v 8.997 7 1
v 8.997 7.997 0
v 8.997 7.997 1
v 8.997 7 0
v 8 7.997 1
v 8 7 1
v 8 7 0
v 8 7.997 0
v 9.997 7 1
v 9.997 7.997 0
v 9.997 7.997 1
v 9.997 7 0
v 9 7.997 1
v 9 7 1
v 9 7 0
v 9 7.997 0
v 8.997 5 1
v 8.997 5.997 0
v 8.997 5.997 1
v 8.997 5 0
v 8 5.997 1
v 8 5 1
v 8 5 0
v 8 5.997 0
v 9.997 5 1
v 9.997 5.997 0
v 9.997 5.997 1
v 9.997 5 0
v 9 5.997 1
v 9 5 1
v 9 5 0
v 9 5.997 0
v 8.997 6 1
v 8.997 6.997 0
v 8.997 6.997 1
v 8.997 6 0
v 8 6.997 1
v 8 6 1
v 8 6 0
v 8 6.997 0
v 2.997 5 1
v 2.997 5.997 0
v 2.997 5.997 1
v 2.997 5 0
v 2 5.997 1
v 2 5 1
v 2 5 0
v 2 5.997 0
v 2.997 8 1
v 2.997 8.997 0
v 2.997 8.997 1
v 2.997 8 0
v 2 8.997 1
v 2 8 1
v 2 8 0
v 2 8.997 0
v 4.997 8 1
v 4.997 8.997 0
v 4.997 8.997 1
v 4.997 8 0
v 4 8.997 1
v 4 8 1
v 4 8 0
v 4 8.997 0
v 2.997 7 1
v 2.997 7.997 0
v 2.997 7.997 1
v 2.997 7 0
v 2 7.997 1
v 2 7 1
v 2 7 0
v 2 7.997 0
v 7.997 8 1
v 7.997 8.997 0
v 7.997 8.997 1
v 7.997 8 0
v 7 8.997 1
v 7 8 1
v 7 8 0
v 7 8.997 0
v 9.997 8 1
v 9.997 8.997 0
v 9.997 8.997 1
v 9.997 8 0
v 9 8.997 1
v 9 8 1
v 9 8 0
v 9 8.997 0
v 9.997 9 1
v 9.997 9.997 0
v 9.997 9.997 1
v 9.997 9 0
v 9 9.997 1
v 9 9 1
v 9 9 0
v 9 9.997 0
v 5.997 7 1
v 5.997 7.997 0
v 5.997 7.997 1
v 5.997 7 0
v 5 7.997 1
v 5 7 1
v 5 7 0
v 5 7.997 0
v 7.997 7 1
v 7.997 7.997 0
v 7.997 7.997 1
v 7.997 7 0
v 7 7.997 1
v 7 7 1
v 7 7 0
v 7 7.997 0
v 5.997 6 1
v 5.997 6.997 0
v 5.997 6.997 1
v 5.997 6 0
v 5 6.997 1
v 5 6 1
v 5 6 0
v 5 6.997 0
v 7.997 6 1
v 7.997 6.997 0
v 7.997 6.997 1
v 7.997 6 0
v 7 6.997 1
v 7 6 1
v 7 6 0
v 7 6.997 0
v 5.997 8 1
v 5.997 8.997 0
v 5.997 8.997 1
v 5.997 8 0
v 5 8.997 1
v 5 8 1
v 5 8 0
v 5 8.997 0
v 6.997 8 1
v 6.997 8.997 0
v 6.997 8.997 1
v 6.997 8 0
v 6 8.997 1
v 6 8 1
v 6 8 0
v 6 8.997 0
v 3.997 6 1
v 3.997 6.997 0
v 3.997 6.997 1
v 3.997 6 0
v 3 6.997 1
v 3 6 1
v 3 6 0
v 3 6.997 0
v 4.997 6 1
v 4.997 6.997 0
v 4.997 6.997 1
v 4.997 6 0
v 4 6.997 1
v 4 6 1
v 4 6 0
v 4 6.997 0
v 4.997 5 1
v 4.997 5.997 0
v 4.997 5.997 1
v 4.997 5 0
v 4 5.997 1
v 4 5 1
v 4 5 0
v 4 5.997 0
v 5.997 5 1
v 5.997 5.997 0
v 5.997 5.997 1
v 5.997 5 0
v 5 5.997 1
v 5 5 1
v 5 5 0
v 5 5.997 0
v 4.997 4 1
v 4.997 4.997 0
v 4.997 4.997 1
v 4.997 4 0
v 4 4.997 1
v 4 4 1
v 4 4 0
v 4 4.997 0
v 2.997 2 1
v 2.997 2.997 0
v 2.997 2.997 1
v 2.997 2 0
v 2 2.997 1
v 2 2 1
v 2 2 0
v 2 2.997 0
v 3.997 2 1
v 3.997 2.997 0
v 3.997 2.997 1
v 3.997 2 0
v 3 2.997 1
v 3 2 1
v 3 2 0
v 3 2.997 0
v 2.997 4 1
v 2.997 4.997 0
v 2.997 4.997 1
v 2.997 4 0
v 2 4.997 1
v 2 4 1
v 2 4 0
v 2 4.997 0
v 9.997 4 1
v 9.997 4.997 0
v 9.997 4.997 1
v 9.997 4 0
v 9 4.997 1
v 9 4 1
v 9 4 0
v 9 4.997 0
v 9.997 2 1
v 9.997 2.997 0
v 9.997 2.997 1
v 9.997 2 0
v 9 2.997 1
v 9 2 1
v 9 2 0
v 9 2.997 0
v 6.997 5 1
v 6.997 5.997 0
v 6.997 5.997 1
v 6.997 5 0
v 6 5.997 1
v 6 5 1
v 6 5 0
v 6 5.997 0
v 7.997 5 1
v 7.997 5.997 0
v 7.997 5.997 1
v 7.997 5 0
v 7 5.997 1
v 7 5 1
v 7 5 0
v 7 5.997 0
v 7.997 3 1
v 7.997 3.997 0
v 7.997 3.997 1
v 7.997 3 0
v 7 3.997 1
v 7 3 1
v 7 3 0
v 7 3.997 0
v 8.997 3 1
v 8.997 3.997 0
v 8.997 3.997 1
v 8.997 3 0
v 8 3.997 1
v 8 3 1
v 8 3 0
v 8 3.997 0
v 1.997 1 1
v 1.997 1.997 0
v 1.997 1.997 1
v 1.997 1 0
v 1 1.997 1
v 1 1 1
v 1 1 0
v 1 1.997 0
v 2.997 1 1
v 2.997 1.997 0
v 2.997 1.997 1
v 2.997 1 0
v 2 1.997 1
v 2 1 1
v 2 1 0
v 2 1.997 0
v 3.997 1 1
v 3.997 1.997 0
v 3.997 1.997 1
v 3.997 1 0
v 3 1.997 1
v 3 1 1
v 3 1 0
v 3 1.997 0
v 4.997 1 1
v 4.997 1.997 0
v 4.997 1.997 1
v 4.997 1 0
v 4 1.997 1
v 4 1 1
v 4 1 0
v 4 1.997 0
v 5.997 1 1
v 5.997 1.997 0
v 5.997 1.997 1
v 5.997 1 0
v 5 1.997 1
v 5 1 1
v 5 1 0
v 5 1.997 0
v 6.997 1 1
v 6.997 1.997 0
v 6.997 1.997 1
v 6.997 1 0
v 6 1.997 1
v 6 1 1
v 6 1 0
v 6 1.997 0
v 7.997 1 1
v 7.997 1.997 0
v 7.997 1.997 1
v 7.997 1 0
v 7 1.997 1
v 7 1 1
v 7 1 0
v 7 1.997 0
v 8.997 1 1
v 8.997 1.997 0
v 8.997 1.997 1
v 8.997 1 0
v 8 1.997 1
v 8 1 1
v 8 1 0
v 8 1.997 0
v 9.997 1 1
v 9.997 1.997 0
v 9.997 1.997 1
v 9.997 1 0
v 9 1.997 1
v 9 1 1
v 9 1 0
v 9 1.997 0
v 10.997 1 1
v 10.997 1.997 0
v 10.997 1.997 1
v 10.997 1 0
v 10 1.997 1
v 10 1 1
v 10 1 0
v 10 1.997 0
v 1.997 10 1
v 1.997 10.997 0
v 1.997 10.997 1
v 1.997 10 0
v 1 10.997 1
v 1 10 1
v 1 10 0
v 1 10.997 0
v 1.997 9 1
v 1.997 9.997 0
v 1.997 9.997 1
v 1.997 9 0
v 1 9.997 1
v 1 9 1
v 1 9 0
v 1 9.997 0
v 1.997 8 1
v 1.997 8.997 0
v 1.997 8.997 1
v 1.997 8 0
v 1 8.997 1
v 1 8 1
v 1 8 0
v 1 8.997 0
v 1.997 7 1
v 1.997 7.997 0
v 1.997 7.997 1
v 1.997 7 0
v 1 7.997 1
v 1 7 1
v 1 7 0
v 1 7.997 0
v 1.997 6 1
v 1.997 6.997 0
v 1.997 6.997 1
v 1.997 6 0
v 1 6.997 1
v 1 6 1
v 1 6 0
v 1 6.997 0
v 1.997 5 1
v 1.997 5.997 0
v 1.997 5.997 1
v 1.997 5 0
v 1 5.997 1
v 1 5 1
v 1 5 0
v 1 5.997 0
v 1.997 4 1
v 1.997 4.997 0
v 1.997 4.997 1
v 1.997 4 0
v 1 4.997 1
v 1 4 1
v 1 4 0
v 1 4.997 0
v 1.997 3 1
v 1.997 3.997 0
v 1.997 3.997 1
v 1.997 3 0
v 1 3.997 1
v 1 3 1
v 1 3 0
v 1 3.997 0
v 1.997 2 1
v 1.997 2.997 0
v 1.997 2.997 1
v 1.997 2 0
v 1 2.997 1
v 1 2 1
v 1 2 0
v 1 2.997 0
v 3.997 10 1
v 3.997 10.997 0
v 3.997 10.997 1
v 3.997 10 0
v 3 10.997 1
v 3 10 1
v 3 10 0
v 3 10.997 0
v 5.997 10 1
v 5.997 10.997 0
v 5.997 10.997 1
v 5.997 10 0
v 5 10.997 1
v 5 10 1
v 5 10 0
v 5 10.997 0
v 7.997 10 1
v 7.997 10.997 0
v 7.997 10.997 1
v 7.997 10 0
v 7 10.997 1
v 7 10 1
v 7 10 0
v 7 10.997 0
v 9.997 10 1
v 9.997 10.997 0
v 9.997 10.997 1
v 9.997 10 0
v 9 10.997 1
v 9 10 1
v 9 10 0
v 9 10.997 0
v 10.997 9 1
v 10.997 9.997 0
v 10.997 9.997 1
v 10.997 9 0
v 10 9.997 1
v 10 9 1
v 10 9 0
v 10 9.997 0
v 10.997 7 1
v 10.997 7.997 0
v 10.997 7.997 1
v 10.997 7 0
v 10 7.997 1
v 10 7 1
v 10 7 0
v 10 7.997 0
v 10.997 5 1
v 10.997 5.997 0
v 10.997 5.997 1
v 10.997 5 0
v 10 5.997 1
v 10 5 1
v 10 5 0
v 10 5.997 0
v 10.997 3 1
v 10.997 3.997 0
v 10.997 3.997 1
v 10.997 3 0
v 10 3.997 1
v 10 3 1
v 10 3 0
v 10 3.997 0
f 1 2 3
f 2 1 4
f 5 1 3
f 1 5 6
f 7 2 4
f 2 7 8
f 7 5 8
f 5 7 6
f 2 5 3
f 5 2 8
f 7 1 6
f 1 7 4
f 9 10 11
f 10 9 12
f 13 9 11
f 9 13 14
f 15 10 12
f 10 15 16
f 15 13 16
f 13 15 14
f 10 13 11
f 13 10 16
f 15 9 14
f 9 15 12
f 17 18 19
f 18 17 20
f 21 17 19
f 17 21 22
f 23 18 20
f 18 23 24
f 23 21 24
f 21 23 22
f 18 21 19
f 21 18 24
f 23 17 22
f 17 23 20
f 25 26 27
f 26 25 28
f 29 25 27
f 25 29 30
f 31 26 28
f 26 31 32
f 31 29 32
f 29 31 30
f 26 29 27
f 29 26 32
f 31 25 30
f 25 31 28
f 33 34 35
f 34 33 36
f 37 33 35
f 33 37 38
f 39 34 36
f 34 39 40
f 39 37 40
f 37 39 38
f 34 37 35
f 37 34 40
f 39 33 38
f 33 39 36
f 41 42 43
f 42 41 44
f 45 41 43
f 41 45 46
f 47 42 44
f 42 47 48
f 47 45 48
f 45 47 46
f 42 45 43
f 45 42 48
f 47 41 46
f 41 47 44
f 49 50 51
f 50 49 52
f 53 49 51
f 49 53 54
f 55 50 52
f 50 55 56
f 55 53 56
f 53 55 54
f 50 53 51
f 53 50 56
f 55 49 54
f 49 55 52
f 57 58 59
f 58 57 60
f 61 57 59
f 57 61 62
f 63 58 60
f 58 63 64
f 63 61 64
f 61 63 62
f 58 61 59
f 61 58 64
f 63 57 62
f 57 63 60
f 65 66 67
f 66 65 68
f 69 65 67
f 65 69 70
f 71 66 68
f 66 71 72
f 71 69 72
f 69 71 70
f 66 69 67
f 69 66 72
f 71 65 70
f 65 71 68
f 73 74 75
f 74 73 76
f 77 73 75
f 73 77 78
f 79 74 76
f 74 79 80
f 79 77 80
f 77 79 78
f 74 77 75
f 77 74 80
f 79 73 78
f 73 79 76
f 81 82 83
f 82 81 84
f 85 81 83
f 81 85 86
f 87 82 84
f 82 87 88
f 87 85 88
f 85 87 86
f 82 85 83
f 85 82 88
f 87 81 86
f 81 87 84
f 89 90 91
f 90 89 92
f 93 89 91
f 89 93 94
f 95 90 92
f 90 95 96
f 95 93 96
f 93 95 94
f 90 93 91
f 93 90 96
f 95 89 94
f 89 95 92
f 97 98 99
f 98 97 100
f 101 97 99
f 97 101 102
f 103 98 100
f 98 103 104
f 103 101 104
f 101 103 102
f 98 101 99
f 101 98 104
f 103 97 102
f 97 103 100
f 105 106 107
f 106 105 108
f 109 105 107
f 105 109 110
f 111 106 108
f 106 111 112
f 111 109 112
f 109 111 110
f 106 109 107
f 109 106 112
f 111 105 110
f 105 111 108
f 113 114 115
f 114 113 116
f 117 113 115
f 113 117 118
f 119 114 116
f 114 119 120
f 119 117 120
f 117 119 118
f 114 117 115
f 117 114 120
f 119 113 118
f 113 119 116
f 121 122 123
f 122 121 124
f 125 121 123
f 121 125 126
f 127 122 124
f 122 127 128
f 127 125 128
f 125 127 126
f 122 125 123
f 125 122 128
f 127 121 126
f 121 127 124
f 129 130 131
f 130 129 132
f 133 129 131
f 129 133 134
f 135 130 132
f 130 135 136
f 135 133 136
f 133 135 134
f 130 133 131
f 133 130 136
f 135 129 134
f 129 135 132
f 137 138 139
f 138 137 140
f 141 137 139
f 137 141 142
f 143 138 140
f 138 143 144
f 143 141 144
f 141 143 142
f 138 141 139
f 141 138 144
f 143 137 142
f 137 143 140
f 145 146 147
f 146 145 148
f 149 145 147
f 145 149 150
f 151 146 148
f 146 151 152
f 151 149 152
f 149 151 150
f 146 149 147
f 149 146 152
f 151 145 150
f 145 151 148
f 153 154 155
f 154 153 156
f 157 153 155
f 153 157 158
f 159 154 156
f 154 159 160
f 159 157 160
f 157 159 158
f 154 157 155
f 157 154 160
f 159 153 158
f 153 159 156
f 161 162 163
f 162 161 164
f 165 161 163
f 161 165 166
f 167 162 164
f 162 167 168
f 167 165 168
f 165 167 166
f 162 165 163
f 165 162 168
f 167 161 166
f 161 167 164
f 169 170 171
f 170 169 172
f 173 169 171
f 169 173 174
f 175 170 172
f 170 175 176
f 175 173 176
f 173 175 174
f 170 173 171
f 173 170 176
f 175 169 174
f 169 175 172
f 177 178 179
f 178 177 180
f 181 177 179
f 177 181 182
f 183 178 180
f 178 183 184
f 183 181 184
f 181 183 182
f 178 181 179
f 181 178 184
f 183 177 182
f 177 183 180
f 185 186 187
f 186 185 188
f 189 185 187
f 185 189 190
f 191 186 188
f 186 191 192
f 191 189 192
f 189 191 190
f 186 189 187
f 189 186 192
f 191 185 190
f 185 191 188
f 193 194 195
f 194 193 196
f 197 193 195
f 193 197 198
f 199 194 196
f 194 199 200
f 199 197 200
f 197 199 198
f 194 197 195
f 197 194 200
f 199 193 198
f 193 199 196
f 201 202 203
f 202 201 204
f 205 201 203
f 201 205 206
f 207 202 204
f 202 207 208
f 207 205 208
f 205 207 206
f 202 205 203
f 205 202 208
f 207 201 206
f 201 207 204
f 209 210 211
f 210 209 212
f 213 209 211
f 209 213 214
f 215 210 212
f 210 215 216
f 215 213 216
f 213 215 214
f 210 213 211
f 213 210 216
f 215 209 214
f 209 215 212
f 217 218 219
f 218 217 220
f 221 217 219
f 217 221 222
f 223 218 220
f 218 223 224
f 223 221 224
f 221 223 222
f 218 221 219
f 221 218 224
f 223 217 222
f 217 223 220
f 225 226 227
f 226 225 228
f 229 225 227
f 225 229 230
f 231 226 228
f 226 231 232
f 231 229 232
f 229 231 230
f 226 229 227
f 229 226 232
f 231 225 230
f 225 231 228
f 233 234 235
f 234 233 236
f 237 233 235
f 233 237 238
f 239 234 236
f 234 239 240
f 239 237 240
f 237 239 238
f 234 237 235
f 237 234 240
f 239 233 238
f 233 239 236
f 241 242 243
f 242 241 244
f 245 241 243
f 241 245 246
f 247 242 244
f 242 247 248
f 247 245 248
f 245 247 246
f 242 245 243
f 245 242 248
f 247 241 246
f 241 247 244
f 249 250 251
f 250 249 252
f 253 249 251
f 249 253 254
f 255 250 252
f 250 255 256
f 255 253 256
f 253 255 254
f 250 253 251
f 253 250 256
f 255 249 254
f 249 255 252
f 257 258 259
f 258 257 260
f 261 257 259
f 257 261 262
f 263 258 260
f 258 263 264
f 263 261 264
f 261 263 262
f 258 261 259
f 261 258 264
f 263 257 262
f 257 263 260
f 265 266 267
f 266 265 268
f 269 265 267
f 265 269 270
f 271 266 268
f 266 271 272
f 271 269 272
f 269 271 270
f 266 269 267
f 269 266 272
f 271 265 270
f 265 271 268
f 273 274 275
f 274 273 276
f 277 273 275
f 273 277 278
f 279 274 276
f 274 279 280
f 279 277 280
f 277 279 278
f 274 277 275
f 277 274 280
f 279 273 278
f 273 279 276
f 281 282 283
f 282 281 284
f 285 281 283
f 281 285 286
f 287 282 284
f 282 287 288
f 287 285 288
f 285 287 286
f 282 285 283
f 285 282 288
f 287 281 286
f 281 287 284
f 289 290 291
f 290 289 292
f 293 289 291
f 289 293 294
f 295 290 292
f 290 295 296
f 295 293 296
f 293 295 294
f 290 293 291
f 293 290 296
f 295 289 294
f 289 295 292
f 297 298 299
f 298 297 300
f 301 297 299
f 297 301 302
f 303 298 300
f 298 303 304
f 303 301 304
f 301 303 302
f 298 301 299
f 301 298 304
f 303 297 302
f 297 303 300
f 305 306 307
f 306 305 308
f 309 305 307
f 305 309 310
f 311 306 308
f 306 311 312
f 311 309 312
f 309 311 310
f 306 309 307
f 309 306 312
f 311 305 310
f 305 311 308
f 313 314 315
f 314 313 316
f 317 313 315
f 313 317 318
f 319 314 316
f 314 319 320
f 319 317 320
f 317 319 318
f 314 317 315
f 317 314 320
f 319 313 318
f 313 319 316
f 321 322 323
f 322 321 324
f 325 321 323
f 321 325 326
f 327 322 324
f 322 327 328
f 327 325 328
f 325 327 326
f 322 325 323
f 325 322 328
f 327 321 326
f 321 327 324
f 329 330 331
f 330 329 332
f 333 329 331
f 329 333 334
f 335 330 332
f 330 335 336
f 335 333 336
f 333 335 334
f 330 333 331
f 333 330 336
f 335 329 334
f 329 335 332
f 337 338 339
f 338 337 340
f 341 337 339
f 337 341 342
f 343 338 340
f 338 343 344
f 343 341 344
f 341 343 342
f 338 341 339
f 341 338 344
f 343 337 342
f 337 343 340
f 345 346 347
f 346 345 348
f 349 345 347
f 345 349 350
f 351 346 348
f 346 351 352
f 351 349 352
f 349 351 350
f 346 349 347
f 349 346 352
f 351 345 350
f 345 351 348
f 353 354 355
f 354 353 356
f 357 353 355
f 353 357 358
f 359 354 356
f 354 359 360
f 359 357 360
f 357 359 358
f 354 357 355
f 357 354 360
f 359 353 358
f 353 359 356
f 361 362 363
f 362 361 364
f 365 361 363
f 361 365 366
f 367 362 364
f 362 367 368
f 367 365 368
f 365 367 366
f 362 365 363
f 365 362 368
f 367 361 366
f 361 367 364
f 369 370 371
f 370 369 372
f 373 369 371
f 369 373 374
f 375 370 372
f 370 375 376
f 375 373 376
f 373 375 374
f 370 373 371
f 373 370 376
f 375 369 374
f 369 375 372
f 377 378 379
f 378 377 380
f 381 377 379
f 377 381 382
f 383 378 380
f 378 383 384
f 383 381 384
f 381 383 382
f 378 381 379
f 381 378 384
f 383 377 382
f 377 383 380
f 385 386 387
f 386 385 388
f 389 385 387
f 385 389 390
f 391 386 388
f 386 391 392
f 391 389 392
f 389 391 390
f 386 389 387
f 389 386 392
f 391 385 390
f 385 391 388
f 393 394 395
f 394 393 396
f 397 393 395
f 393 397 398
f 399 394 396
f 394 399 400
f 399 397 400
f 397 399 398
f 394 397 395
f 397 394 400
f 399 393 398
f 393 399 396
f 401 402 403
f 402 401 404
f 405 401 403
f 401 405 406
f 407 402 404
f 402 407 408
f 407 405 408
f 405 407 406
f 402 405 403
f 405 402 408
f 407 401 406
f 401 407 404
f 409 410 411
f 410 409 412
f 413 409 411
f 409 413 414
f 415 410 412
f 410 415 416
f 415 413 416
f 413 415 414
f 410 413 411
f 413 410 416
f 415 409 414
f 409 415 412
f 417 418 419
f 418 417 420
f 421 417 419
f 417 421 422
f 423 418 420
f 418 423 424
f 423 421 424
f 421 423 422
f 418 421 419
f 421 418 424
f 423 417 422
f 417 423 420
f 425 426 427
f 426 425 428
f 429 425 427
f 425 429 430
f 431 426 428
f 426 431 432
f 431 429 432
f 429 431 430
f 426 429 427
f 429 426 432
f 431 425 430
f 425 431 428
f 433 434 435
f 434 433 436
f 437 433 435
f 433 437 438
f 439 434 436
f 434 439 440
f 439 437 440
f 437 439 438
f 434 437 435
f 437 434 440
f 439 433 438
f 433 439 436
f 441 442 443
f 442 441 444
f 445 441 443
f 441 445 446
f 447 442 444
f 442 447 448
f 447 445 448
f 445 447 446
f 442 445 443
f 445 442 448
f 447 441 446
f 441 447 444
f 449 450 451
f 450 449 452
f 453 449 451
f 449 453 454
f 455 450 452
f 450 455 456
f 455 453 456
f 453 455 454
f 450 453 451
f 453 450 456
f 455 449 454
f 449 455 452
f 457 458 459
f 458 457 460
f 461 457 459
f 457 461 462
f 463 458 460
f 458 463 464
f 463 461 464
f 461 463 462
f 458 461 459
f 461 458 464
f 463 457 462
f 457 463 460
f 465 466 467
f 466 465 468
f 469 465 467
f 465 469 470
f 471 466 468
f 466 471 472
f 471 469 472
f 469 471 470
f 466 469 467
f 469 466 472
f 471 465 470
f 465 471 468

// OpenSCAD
// file: ../../util/bitmap.scad
/*****************************************************************************
 * Module Bitmap Library
 * Modules to create bitmaps of unit squares from 1 or 2 dimensional vectors.
 *****************************************************************************
 * Copyright 2017 Chris Baker
 *
 * This program is free software: you can redistribute it and/or modify
 * it under the terms of the GNU Lesser General Public License as published by
 * the Free Software Foundation, either version 3 of the License, or
 * (at your option) any later version.
 *
 * This program is distributed in the hope that it will be useful,
 * but WITHOUT ANY WARRANTY; without even the implied warranty of
 * MERCHANTABILITY or FITNESS FOR A PARTICULAR PURPOSE.  See the
 * GNU Lesser General Public License for more details.
 *
 * You should have received a copy of the GNU Lesser General Public License
 * along with this program.  If not, see <http://www.gnu.org/licenses/>.
 *****************************************************************************
 * Usage:
 * Include this file with the "use" tag.
 * Depends on compat.scad library.
 *
 * API:
 *   1dbitmap(bitmap, center, pullback, vector_mode)
 *   2dbitmap(bitmap, center, pullback, vector_mode)
 *     Generate a 1 or 2-Dimensional field of modules based on the provided
 *     bitmap vector. See Bitmap Vectors below.
 *     The center flag determines whether to center the bitmap on the origin.
 *     The pullback value shrinks each module in the x and y dimension by the
 *     specified amount. A negative value will expand the modules so they
 *     blend into each other.
 *     The vector_mode flag determines whether to create 3D solid geometry
 *     (unit cubes) or 2D vector geometry (squares).
 *
 * Bitmap Vectors:
 *   The bitmap vectors primarily provide boolean information.
 *   A module will be placed where these vectors have a postive value and
 *   skipped where they have a negative value. I.E. 0, -1, false, and undef
 *   are all equivalent and result in a skip. 1 and true are equivalent and
 *   result in a placed 1-unit module.
 *   Further, if the value is an integer it will be treated as a height for
 *   the module, allowing z-maps to be created.
 *   If the value is not an integer or boolean, it will be treated as a color
 *   reference. This can be a string or RGBA vector that will be used to
 *   color the module in the OpenSCAD preview window.
 *   In current versions of OpenSCAD, the color has no effect in the rendered
 *   view or STL output.
 *
 * Vector Mode:
 *   Although OpenSCAD supports generating 2D geometry, there are several
 *   caveats:
 *   - 2D and 3D geometry cannot be mixed
 *   - Extruding 2D geometry causes color information to be lost
 *   - All 2D geometry is projected onto the XY plane when rendering
 *   - Rendering also results in loss of color (same as 3D)
 *   - The SVG exporter is somewhat limited:
 *     - The pixel size of the image is hard-coded in the file
 *     - The title of the image is a generic string
 *     - The color selection for stroke and fill is fixed
 *     - The stroke-width is set to a large value that will cause overlap
 *     - The background is transparent
 *     - Only one path element is created with all of the geometry; there is
 *       no easy way to split up the geometry into multiple logical units.
 *     - These issues can mostly be resolved by hand-editing the file:
 *       - Remove or modify the width and height parameters from the svg
 *         element at the top of the file to provide better scaling.
 *       - Edit the title element at the top of the file to change the title.
 *       - Edit the stroke and fill parameters of the path element (these will
 *         probably be at the end of the file).
 *       - Set the stroke-width parameter for the path element to 0.
 *****************************************************************************/
use <compat.scad>

/*
 * 2dbitmap - Turn a 2D vector into a bitmap of cubes
 *
 * bitmap - 2D vector representing where to place each cube
 *          Value can either be boolean, z-height, or color
 * center - center cubes around the origin
 * pullback - size of gap around each pixel (screendoor)
 * vector_mode - create a 2D vector drawing instead of 3D extrusion
 */
module 2dbitmap(bitmap=[[1,0],[0,1]], center=false, pullback=0.003, vector_mode=false)
{
  if (bitmap!=undef) {
	ylen=len(bitmap)-1;

	for (y=[0:ylen]) {
		xlen=len(bitmap[y])-1;
		for (x=[0:xlen])
			translate([x-(center?xlen/2:0),ylen-y-(center?ylen/2:0),0])
				if (is_indexable(bitmap[y][x]))
					color(bitmap[y][x])
						if (vector_mode)
							square([1-pullback,1-pullback], center=center);
						else
							cube([1-pullback,1-pullback,1], center=center);
				else
					if (bitmap[y][x])
						if (vector_mode)
							square([1-pullback,1-pullback], center=center);
						else
							cube([1-pullback,1-pullback,clamp_nonnum(bitmap[y][x])], center=center);
	}
  }
}

module 1dbitmap(bitmap=[1,0,1,0,1], center=false, pullback=-0.003, vector_mode=false)
	if (bitmap!=undef)
		2dbitmap([bitmap], center, pullback, vector_mode);

/*
 * Examples
 */

// 1D with z-height
translate([10,0,0]) scale([1,10,1])
	1dbitmap(bitmap=[1,1,0,2,0,0,3], pullback=.1);

// 1D with boolean
translate([-20,0,0]) scale([1,10,1])
	1dbitmap(bitmap=[true,false,true,false,true,true]);

// 2D with z-height
scale([2,2,1])
	2dbitmap(bitmap=[[1,0,2,1],[0,3,3,0],[1,1,0,1]],
		center=true);

// 1D with color
translate([0,-10,0]) scale([1,3,1])
	1dbitmap(bitmap=["red","white","blue",[0,0.3,0,0.5]]);

// 1D with color using 2D-vector-mode
translate([-7,-8,0]) scale([1,2])
	1dbitmap(bitmap=["red",0,"blue",0,"green"], vector_mode=true);
translate([-4.5,-10,0]) scale([1,2])
	1dbitmap(bitmap=["red",0,"blue",0,"green"], vector_mode=true, center=true);

// Check behavior with undef
1dbitmap(undef);
2dbitmap(undef);
// file: ../../util/bitlib.scad
/*****************************************************************************
 * Bit Manipulation Library
 * Provides some useful bit manipulation functions.
 *****************************************************************************
 * Copyright 2017 Chris Baker
 *
 * This program is free software: you can redistribute it and/or modify
 * it under the terms of the GNU Lesser General Public License as published by
 * the Free Software Foundation, either version 3 of the License, or
 * (at your option) any later version.
 *
 * This program is distributed in the hope that it will be useful,
 * but WITHOUT ANY WARRANTY; without even the implied warranty of
 * MERCHANTABILITY or FITNESS FOR A PARTICULAR PURPOSE.  See the
 * GNU Lesser General Public License for more details.
 *
 * You should have received a copy of the GNU Lesser General Public License
 * along with this program.  If not, see <http://www.gnu.org/licenses/>.
 *****************************************************************************
 * Usage:
 * Include this file with the "use" tag.
 * When run on its own, all echo statements in this library should print
 * "true".
 *
 * API:
 *   bit(v,b)
 *     Return the truth value of the b'th bit of v.
 *
 *   check_bit_size(v,b,signed=false)
 *     Determine whether the value v can be represented with b bits (b must
 *     be positive).
 *     The signed flag indicates whether to include the sign bit in the
 *     determination; otherwise negative values will result in undef being
 *     returned.
 *
 *   xor(a,b)
 *     Return the value of a xor b.
 *     Handles arbitrary size values for a and b.
 *     Handles negative values as expected (a positive result will be returned
 *     unless a and b have differing signs).
 *
 * TODO:
 *  - Change echos to asserts (future OpenSCAD version)
 *  - Add more functions
 *
 *****************************************************************************/

//Return the truth value of the b'th bit of v
function bit(v,b) =
	((v==undef)||(b==undef)||(b<0))?undef:
	(floor(v / pow(2, b)) % 2)?true:false;

echo("*** bit() testcases ***");
echo(0,bit(0,0)==false);
echo(1,bit(-1,0)==true);
echo(2,bit(1,0)==true);
echo(3,[for (i=[0:63]) bit(0,i)]==[for (i=[0:63]) false]); //0=0...0
echo(4,[for (i=[0:63]) bit(-1,i)]==[for (i=[0:63]) true]); //-1=1...1
echo(5,[for (i=[1:63]) bit(1,i)]==[for (i=[1:63]) false]); //1=0...01
echo(6,[for (i=[0:7]) bit(85,i)?1:0]==[1,0,1,0,1,0,1,0]); //85=01010101
echo(7,[for (i=[0:7]) bit(170,i)?1:0]==[0,1,0,1,0,1,0,1]); //170=10101010
echo(8,[for (i=[0:7]) bit(165,i)?1:0]==[1,0,1,0,0,1,0,1]); //165=10100101
echo(9,[for (i=[0:7]) bit(56,i)?1:0]==[0,0,0,1,1,1,0,0]); //56=00111000
echo(10,[for (i=[0:7]) bit(-3,i)?1:0]==[1,0,1,1,1,1,1,1]); //-3=1...101
//(2^64)=0...01 0...0
echo(11,bit(pow(2,64),64)==true);
echo(12,[for (i=[0:63]) bit(pow(2,64),i)]==[for (i=[0:63]) false]);
echo(13,[for (i=[65:127]) bit(pow(2,64),i)]==[for (i=[1:63]) false]);
//-(2^64)=1...1 0...0
echo(14,[for (i=[0:63]) bit(-pow(2,64),i)]==[for (i=[0:63]) false]);
echo(15,[for (i=[64:127]) bit(-pow(2,64),i)]==[for (i=[0:63]) true]);
echo(16,bit(10,-1)==undef);
echo(17,bit(10,undef)==undef);
echo(18,bit(undef,3)==undef);

//return true if v can be represented in b bits
//if signed flag is set. the result will be adjusted
//to account for the needed sign bit
function check_bit_size(v,b,signed=false) =
	(b<0)?undef:
	(v==undef)?undef:
	(b==0)?false:
	(v==0)?true: //(b>0)
	(signed)?
		(v<0)?(-pow(2,b-1)<(v+1)):
			(pow(2,b-1)>(v+1)):
		(v<0)?undef:
			(pow(2,b)>v);

echo("*** check_bit_size() testcases ***");
echo(0,check_bit_size(-1,2)==undef);
echo(1,check_bit_size(2,-4)==undef);
echo(2,check_bit_size(2,-4,signed=true)==undef);
echo(3,check_bit_size(0,0)==false);
echo(4,check_bit_size(0,1)==true);
echo(5,check_bit_size(1,0)==false);
echo(6,check_bit_size(1,1)==true);
echo(7,check_bit_size(7,3)==true);
echo(8,check_bit_size(8,3)==false);
echo(9,check_bit_size(1,3)==true);
echo(10,check_bit_size(256,8)==false);
echo(11,check_bit_size(255,8)==true);
echo(12,check_bit_size(10,2)==false);
echo(13,check_bit_size(10,4)==true);
echo(14,check_bit_size(-10,2,signed=true)==false);
echo(15,check_bit_size(-10,4,signed=true)==false);
echo(16,check_bit_size(-10,5,signed=true)==true);
echo(17,check_bit_size(-1,0,signed=true)==false);
echo(18,check_bit_size(-1,1,signed=true)==true);
echo(19,check_bit_size(0,0,signed=true)==false);
echo(20,check_bit_size(0,1,signed=true)==true);
echo(21,check_bit_size(-2,2,signed=true)==true);
echo(22,check_bit_size(-3,2,signed=true)==false);
echo(23,check_bit_size(-3,3,signed=true)==true);
echo(24,check_bit_size(-8,3,signed=true)==false);
echo(25,check_bit_size(-8,4,signed=true)==true);
echo(26,check_bit_size(undef,4)==undef);
echo(27,check_bit_size(undef,4,signed=true)==undef);

//return the value of a xor b
//runs recursively until all bits of a and b are exhausted
function xor(a,b,i=0) =
	((a==undef)||(b==undef))?undef:
	let (c=bit(a,i), d=bit(b,i),
		 v=((c||d) && !(c&&d))?pow(2,i):0)
		(check_bit_size(a,i,signed=true) &&
		 check_bit_size(b,i,signed=true))?
			-v: //special case for sign bit
			v+xor(a,b,i+1); //recursively add powers of 2

echo("*** xor() testcases ***");
echo(0,xor(42,0)==42);
echo(1,xor(42,42)==0);
echo(2,xor(169,238)==71); //10101001^11101110=01000111=71
echo(3,xor(238,169)==71);
echo(4,xor(42,238)==196); //00101010^11101110=11000100=196
echo(5,xor(169,42)==131); //10101001^00101010=10000011=131
echo(6,xor(-8,-10)==14); //11000^10110=01110=14
echo(7,xor(-7,-10)==15); //11001^10110=01111=15
echo(8,xor(9,-10)==-1); //01001^10110=11111=-1
echo(9,xor(9,-12)==-3); //01001^10100=11101=-3
echo(10,xor(undef,0)==undef);
// file: ../../util/stringlib.scad
/*****************************************************************************
 * String Manipulation Library
 * Provides some useful string manipulation functions.
 *****************************************************************************
 * Copyright 2017 Chris Baker
 *
 * This program is free software: you can redistribute it and/or modify
 * it under the terms of the GNU Lesser General Public License as published by
 * the Free Software Foundation, either version 3 of the License, or
 * (at your option) any later version.
 *
 * This program is distributed in the hope that it will be useful,
 * but WITHOUT ANY WARRANTY; without even the implied warranty of
 * MERCHANTABILITY or FITNESS FOR A PARTICULAR PURPOSE.  See the
 * GNU Lesser General Public License for more details.
 *
 * You should have received a copy of the GNU Lesser General Public License
 * along with this program.  If not, see <http://www.gnu.org/licenses/>.
 *****************************************************************************
 * Usage:
 * Include this file with the "use" tag.
 * Depends on compat.scad library.
 *
 * API:
 *   atoi(a)
 *     Convert the string of numerals, a, to a vector of individual decimal
 *     numbers.
 *
 *   ascii_to_vec(a)
 *     Convert the ASCII string, a, into a vector of decimal numbers.
 *
 *****************************************************************************/
use <compat.scad>

/*
 * atoi - convert ASCII numerals to a vector of individual decimal numbers
 *
 * a - the ASCII string of numerals
 */
function atoi(a) = (isa_string(a))?
	[
		let (val = search(a, "0123456789"))
			for (i = val) i
	]
	:
	undef;

/* *** atoi() testcases *** */
do_assert(atoi(undef)==undef,     "atoi test 00");
do_assert(atoi(true)==undef,      "atoi test 01");
do_assert(atoi(false)==undef,     "atoi test 02");
do_assert(atoi([])==undef,        "atoi test 03");
do_assert(atoi([1,2,3])==undef,   "atoi test 04");
do_assert(atoi("")==[],           "atoi test 05");
do_assert(atoi("0")==[0],         "atoi test 06");
do_assert(atoi("1")==[1],         "atoi test 07");
do_assert(atoi("2")==[2],         "atoi test 08");
do_assert(atoi("3")==[3],         "atoi test 09");
do_assert(atoi("4")==[4],         "atoi test 10");
do_assert(atoi("5")==[5],         "atoi test 11");
do_assert(atoi("6")==[6],         "atoi test 12");
do_assert(atoi("7")==[7],         "atoi test 13");
do_assert(atoi("8")==[8],         "atoi test 14");
do_assert(atoi("9")==[9],         "atoi test 15");
do_assert(atoi("123")==[1,2,3],   "atoi test 16");
do_assert(atoi("1a23b")==[1,2,3], "atoi test 17"); //degenerate case, don't really care too much about the result

/*
 * ascii_to_vec - convert ASCII string to decimal vector
 *
 * a - the ASCII string to vectorize
 */
function ascii_to_vec(a) = (isa_string(a))?
	[
		let (val = search(a, "\x01\x02\x03\x04\x05\x06\x07\x08\x09\x0a\x0b\x0c\x0d\x0e\x0f\x10\x11\x12\x13\x14\x15\x16\x17\x18\x19\x1a\x1b\x1c\x1d\x1e\x1f !\"#$%&'()*+,-./0123456789:;<=>?@ABCDEFGHIJKLMNOPQRSTUVWXYZ[\\]^_`abcdefghijklmnopqrstuvwxyz{|}~\x7f"))
			for (i = val) i+1
	]:
	undef;

/* *** ascii_to_vec() testcases *** */
do_assert(ascii_to_vec(undef)==undef,   "ascii_to_vec test 01");
do_assert(ascii_to_vec(true)==undef,    "ascii_to_vec test 02");
do_assert(ascii_to_vec(false)==undef,   "ascii_to_vec test 03");
do_assert(ascii_to_vec([])==undef,      "ascii_to_vec test 04");
do_assert(ascii_to_vec([1,2,3])==undef, "ascii_to_vec test 05");
do_assert(ascii_to_vec("")==[],         "ascii_to_vec test 06");
do_assert(ascii_to_vec("0")==[48],      "ascii_to_vec test 07");
do_assert(ascii_to_vec("a")==[97],      "ascii_to_vec test 08");
do_assert(ascii_to_vec("0123456789")==[48,49,50,51,52,53,54,55,56,57],
	"ascii_to_vec test 09");
do_assert(ascii_to_vec("The quick brown fox jumped over the lazy dog.")
	==[84,104,101,32,113,117,105,99,107,32,98,114,111,119,110,32,102,111,120,32,106,117,109,112,101,100,32,111,118,101,114,32,116,104,101,32,108,97,122,121,32,100,111,103,46],
	"ascii_to_vec test 10");
// main file
/* Unit Test 14: 10x10 - 3 data bytes, 5 ecc bytes - base-256 mode example */
/* This example shows use of base-256 mode. */
/* The data is a single byte (63=0x3F='?'). */
use <../datamatrix.scad>
data_matrix(
	dm_base256_append(
		[base256_mode()],
		[63],
		fills_symbol=true
	),
	mark="black");
